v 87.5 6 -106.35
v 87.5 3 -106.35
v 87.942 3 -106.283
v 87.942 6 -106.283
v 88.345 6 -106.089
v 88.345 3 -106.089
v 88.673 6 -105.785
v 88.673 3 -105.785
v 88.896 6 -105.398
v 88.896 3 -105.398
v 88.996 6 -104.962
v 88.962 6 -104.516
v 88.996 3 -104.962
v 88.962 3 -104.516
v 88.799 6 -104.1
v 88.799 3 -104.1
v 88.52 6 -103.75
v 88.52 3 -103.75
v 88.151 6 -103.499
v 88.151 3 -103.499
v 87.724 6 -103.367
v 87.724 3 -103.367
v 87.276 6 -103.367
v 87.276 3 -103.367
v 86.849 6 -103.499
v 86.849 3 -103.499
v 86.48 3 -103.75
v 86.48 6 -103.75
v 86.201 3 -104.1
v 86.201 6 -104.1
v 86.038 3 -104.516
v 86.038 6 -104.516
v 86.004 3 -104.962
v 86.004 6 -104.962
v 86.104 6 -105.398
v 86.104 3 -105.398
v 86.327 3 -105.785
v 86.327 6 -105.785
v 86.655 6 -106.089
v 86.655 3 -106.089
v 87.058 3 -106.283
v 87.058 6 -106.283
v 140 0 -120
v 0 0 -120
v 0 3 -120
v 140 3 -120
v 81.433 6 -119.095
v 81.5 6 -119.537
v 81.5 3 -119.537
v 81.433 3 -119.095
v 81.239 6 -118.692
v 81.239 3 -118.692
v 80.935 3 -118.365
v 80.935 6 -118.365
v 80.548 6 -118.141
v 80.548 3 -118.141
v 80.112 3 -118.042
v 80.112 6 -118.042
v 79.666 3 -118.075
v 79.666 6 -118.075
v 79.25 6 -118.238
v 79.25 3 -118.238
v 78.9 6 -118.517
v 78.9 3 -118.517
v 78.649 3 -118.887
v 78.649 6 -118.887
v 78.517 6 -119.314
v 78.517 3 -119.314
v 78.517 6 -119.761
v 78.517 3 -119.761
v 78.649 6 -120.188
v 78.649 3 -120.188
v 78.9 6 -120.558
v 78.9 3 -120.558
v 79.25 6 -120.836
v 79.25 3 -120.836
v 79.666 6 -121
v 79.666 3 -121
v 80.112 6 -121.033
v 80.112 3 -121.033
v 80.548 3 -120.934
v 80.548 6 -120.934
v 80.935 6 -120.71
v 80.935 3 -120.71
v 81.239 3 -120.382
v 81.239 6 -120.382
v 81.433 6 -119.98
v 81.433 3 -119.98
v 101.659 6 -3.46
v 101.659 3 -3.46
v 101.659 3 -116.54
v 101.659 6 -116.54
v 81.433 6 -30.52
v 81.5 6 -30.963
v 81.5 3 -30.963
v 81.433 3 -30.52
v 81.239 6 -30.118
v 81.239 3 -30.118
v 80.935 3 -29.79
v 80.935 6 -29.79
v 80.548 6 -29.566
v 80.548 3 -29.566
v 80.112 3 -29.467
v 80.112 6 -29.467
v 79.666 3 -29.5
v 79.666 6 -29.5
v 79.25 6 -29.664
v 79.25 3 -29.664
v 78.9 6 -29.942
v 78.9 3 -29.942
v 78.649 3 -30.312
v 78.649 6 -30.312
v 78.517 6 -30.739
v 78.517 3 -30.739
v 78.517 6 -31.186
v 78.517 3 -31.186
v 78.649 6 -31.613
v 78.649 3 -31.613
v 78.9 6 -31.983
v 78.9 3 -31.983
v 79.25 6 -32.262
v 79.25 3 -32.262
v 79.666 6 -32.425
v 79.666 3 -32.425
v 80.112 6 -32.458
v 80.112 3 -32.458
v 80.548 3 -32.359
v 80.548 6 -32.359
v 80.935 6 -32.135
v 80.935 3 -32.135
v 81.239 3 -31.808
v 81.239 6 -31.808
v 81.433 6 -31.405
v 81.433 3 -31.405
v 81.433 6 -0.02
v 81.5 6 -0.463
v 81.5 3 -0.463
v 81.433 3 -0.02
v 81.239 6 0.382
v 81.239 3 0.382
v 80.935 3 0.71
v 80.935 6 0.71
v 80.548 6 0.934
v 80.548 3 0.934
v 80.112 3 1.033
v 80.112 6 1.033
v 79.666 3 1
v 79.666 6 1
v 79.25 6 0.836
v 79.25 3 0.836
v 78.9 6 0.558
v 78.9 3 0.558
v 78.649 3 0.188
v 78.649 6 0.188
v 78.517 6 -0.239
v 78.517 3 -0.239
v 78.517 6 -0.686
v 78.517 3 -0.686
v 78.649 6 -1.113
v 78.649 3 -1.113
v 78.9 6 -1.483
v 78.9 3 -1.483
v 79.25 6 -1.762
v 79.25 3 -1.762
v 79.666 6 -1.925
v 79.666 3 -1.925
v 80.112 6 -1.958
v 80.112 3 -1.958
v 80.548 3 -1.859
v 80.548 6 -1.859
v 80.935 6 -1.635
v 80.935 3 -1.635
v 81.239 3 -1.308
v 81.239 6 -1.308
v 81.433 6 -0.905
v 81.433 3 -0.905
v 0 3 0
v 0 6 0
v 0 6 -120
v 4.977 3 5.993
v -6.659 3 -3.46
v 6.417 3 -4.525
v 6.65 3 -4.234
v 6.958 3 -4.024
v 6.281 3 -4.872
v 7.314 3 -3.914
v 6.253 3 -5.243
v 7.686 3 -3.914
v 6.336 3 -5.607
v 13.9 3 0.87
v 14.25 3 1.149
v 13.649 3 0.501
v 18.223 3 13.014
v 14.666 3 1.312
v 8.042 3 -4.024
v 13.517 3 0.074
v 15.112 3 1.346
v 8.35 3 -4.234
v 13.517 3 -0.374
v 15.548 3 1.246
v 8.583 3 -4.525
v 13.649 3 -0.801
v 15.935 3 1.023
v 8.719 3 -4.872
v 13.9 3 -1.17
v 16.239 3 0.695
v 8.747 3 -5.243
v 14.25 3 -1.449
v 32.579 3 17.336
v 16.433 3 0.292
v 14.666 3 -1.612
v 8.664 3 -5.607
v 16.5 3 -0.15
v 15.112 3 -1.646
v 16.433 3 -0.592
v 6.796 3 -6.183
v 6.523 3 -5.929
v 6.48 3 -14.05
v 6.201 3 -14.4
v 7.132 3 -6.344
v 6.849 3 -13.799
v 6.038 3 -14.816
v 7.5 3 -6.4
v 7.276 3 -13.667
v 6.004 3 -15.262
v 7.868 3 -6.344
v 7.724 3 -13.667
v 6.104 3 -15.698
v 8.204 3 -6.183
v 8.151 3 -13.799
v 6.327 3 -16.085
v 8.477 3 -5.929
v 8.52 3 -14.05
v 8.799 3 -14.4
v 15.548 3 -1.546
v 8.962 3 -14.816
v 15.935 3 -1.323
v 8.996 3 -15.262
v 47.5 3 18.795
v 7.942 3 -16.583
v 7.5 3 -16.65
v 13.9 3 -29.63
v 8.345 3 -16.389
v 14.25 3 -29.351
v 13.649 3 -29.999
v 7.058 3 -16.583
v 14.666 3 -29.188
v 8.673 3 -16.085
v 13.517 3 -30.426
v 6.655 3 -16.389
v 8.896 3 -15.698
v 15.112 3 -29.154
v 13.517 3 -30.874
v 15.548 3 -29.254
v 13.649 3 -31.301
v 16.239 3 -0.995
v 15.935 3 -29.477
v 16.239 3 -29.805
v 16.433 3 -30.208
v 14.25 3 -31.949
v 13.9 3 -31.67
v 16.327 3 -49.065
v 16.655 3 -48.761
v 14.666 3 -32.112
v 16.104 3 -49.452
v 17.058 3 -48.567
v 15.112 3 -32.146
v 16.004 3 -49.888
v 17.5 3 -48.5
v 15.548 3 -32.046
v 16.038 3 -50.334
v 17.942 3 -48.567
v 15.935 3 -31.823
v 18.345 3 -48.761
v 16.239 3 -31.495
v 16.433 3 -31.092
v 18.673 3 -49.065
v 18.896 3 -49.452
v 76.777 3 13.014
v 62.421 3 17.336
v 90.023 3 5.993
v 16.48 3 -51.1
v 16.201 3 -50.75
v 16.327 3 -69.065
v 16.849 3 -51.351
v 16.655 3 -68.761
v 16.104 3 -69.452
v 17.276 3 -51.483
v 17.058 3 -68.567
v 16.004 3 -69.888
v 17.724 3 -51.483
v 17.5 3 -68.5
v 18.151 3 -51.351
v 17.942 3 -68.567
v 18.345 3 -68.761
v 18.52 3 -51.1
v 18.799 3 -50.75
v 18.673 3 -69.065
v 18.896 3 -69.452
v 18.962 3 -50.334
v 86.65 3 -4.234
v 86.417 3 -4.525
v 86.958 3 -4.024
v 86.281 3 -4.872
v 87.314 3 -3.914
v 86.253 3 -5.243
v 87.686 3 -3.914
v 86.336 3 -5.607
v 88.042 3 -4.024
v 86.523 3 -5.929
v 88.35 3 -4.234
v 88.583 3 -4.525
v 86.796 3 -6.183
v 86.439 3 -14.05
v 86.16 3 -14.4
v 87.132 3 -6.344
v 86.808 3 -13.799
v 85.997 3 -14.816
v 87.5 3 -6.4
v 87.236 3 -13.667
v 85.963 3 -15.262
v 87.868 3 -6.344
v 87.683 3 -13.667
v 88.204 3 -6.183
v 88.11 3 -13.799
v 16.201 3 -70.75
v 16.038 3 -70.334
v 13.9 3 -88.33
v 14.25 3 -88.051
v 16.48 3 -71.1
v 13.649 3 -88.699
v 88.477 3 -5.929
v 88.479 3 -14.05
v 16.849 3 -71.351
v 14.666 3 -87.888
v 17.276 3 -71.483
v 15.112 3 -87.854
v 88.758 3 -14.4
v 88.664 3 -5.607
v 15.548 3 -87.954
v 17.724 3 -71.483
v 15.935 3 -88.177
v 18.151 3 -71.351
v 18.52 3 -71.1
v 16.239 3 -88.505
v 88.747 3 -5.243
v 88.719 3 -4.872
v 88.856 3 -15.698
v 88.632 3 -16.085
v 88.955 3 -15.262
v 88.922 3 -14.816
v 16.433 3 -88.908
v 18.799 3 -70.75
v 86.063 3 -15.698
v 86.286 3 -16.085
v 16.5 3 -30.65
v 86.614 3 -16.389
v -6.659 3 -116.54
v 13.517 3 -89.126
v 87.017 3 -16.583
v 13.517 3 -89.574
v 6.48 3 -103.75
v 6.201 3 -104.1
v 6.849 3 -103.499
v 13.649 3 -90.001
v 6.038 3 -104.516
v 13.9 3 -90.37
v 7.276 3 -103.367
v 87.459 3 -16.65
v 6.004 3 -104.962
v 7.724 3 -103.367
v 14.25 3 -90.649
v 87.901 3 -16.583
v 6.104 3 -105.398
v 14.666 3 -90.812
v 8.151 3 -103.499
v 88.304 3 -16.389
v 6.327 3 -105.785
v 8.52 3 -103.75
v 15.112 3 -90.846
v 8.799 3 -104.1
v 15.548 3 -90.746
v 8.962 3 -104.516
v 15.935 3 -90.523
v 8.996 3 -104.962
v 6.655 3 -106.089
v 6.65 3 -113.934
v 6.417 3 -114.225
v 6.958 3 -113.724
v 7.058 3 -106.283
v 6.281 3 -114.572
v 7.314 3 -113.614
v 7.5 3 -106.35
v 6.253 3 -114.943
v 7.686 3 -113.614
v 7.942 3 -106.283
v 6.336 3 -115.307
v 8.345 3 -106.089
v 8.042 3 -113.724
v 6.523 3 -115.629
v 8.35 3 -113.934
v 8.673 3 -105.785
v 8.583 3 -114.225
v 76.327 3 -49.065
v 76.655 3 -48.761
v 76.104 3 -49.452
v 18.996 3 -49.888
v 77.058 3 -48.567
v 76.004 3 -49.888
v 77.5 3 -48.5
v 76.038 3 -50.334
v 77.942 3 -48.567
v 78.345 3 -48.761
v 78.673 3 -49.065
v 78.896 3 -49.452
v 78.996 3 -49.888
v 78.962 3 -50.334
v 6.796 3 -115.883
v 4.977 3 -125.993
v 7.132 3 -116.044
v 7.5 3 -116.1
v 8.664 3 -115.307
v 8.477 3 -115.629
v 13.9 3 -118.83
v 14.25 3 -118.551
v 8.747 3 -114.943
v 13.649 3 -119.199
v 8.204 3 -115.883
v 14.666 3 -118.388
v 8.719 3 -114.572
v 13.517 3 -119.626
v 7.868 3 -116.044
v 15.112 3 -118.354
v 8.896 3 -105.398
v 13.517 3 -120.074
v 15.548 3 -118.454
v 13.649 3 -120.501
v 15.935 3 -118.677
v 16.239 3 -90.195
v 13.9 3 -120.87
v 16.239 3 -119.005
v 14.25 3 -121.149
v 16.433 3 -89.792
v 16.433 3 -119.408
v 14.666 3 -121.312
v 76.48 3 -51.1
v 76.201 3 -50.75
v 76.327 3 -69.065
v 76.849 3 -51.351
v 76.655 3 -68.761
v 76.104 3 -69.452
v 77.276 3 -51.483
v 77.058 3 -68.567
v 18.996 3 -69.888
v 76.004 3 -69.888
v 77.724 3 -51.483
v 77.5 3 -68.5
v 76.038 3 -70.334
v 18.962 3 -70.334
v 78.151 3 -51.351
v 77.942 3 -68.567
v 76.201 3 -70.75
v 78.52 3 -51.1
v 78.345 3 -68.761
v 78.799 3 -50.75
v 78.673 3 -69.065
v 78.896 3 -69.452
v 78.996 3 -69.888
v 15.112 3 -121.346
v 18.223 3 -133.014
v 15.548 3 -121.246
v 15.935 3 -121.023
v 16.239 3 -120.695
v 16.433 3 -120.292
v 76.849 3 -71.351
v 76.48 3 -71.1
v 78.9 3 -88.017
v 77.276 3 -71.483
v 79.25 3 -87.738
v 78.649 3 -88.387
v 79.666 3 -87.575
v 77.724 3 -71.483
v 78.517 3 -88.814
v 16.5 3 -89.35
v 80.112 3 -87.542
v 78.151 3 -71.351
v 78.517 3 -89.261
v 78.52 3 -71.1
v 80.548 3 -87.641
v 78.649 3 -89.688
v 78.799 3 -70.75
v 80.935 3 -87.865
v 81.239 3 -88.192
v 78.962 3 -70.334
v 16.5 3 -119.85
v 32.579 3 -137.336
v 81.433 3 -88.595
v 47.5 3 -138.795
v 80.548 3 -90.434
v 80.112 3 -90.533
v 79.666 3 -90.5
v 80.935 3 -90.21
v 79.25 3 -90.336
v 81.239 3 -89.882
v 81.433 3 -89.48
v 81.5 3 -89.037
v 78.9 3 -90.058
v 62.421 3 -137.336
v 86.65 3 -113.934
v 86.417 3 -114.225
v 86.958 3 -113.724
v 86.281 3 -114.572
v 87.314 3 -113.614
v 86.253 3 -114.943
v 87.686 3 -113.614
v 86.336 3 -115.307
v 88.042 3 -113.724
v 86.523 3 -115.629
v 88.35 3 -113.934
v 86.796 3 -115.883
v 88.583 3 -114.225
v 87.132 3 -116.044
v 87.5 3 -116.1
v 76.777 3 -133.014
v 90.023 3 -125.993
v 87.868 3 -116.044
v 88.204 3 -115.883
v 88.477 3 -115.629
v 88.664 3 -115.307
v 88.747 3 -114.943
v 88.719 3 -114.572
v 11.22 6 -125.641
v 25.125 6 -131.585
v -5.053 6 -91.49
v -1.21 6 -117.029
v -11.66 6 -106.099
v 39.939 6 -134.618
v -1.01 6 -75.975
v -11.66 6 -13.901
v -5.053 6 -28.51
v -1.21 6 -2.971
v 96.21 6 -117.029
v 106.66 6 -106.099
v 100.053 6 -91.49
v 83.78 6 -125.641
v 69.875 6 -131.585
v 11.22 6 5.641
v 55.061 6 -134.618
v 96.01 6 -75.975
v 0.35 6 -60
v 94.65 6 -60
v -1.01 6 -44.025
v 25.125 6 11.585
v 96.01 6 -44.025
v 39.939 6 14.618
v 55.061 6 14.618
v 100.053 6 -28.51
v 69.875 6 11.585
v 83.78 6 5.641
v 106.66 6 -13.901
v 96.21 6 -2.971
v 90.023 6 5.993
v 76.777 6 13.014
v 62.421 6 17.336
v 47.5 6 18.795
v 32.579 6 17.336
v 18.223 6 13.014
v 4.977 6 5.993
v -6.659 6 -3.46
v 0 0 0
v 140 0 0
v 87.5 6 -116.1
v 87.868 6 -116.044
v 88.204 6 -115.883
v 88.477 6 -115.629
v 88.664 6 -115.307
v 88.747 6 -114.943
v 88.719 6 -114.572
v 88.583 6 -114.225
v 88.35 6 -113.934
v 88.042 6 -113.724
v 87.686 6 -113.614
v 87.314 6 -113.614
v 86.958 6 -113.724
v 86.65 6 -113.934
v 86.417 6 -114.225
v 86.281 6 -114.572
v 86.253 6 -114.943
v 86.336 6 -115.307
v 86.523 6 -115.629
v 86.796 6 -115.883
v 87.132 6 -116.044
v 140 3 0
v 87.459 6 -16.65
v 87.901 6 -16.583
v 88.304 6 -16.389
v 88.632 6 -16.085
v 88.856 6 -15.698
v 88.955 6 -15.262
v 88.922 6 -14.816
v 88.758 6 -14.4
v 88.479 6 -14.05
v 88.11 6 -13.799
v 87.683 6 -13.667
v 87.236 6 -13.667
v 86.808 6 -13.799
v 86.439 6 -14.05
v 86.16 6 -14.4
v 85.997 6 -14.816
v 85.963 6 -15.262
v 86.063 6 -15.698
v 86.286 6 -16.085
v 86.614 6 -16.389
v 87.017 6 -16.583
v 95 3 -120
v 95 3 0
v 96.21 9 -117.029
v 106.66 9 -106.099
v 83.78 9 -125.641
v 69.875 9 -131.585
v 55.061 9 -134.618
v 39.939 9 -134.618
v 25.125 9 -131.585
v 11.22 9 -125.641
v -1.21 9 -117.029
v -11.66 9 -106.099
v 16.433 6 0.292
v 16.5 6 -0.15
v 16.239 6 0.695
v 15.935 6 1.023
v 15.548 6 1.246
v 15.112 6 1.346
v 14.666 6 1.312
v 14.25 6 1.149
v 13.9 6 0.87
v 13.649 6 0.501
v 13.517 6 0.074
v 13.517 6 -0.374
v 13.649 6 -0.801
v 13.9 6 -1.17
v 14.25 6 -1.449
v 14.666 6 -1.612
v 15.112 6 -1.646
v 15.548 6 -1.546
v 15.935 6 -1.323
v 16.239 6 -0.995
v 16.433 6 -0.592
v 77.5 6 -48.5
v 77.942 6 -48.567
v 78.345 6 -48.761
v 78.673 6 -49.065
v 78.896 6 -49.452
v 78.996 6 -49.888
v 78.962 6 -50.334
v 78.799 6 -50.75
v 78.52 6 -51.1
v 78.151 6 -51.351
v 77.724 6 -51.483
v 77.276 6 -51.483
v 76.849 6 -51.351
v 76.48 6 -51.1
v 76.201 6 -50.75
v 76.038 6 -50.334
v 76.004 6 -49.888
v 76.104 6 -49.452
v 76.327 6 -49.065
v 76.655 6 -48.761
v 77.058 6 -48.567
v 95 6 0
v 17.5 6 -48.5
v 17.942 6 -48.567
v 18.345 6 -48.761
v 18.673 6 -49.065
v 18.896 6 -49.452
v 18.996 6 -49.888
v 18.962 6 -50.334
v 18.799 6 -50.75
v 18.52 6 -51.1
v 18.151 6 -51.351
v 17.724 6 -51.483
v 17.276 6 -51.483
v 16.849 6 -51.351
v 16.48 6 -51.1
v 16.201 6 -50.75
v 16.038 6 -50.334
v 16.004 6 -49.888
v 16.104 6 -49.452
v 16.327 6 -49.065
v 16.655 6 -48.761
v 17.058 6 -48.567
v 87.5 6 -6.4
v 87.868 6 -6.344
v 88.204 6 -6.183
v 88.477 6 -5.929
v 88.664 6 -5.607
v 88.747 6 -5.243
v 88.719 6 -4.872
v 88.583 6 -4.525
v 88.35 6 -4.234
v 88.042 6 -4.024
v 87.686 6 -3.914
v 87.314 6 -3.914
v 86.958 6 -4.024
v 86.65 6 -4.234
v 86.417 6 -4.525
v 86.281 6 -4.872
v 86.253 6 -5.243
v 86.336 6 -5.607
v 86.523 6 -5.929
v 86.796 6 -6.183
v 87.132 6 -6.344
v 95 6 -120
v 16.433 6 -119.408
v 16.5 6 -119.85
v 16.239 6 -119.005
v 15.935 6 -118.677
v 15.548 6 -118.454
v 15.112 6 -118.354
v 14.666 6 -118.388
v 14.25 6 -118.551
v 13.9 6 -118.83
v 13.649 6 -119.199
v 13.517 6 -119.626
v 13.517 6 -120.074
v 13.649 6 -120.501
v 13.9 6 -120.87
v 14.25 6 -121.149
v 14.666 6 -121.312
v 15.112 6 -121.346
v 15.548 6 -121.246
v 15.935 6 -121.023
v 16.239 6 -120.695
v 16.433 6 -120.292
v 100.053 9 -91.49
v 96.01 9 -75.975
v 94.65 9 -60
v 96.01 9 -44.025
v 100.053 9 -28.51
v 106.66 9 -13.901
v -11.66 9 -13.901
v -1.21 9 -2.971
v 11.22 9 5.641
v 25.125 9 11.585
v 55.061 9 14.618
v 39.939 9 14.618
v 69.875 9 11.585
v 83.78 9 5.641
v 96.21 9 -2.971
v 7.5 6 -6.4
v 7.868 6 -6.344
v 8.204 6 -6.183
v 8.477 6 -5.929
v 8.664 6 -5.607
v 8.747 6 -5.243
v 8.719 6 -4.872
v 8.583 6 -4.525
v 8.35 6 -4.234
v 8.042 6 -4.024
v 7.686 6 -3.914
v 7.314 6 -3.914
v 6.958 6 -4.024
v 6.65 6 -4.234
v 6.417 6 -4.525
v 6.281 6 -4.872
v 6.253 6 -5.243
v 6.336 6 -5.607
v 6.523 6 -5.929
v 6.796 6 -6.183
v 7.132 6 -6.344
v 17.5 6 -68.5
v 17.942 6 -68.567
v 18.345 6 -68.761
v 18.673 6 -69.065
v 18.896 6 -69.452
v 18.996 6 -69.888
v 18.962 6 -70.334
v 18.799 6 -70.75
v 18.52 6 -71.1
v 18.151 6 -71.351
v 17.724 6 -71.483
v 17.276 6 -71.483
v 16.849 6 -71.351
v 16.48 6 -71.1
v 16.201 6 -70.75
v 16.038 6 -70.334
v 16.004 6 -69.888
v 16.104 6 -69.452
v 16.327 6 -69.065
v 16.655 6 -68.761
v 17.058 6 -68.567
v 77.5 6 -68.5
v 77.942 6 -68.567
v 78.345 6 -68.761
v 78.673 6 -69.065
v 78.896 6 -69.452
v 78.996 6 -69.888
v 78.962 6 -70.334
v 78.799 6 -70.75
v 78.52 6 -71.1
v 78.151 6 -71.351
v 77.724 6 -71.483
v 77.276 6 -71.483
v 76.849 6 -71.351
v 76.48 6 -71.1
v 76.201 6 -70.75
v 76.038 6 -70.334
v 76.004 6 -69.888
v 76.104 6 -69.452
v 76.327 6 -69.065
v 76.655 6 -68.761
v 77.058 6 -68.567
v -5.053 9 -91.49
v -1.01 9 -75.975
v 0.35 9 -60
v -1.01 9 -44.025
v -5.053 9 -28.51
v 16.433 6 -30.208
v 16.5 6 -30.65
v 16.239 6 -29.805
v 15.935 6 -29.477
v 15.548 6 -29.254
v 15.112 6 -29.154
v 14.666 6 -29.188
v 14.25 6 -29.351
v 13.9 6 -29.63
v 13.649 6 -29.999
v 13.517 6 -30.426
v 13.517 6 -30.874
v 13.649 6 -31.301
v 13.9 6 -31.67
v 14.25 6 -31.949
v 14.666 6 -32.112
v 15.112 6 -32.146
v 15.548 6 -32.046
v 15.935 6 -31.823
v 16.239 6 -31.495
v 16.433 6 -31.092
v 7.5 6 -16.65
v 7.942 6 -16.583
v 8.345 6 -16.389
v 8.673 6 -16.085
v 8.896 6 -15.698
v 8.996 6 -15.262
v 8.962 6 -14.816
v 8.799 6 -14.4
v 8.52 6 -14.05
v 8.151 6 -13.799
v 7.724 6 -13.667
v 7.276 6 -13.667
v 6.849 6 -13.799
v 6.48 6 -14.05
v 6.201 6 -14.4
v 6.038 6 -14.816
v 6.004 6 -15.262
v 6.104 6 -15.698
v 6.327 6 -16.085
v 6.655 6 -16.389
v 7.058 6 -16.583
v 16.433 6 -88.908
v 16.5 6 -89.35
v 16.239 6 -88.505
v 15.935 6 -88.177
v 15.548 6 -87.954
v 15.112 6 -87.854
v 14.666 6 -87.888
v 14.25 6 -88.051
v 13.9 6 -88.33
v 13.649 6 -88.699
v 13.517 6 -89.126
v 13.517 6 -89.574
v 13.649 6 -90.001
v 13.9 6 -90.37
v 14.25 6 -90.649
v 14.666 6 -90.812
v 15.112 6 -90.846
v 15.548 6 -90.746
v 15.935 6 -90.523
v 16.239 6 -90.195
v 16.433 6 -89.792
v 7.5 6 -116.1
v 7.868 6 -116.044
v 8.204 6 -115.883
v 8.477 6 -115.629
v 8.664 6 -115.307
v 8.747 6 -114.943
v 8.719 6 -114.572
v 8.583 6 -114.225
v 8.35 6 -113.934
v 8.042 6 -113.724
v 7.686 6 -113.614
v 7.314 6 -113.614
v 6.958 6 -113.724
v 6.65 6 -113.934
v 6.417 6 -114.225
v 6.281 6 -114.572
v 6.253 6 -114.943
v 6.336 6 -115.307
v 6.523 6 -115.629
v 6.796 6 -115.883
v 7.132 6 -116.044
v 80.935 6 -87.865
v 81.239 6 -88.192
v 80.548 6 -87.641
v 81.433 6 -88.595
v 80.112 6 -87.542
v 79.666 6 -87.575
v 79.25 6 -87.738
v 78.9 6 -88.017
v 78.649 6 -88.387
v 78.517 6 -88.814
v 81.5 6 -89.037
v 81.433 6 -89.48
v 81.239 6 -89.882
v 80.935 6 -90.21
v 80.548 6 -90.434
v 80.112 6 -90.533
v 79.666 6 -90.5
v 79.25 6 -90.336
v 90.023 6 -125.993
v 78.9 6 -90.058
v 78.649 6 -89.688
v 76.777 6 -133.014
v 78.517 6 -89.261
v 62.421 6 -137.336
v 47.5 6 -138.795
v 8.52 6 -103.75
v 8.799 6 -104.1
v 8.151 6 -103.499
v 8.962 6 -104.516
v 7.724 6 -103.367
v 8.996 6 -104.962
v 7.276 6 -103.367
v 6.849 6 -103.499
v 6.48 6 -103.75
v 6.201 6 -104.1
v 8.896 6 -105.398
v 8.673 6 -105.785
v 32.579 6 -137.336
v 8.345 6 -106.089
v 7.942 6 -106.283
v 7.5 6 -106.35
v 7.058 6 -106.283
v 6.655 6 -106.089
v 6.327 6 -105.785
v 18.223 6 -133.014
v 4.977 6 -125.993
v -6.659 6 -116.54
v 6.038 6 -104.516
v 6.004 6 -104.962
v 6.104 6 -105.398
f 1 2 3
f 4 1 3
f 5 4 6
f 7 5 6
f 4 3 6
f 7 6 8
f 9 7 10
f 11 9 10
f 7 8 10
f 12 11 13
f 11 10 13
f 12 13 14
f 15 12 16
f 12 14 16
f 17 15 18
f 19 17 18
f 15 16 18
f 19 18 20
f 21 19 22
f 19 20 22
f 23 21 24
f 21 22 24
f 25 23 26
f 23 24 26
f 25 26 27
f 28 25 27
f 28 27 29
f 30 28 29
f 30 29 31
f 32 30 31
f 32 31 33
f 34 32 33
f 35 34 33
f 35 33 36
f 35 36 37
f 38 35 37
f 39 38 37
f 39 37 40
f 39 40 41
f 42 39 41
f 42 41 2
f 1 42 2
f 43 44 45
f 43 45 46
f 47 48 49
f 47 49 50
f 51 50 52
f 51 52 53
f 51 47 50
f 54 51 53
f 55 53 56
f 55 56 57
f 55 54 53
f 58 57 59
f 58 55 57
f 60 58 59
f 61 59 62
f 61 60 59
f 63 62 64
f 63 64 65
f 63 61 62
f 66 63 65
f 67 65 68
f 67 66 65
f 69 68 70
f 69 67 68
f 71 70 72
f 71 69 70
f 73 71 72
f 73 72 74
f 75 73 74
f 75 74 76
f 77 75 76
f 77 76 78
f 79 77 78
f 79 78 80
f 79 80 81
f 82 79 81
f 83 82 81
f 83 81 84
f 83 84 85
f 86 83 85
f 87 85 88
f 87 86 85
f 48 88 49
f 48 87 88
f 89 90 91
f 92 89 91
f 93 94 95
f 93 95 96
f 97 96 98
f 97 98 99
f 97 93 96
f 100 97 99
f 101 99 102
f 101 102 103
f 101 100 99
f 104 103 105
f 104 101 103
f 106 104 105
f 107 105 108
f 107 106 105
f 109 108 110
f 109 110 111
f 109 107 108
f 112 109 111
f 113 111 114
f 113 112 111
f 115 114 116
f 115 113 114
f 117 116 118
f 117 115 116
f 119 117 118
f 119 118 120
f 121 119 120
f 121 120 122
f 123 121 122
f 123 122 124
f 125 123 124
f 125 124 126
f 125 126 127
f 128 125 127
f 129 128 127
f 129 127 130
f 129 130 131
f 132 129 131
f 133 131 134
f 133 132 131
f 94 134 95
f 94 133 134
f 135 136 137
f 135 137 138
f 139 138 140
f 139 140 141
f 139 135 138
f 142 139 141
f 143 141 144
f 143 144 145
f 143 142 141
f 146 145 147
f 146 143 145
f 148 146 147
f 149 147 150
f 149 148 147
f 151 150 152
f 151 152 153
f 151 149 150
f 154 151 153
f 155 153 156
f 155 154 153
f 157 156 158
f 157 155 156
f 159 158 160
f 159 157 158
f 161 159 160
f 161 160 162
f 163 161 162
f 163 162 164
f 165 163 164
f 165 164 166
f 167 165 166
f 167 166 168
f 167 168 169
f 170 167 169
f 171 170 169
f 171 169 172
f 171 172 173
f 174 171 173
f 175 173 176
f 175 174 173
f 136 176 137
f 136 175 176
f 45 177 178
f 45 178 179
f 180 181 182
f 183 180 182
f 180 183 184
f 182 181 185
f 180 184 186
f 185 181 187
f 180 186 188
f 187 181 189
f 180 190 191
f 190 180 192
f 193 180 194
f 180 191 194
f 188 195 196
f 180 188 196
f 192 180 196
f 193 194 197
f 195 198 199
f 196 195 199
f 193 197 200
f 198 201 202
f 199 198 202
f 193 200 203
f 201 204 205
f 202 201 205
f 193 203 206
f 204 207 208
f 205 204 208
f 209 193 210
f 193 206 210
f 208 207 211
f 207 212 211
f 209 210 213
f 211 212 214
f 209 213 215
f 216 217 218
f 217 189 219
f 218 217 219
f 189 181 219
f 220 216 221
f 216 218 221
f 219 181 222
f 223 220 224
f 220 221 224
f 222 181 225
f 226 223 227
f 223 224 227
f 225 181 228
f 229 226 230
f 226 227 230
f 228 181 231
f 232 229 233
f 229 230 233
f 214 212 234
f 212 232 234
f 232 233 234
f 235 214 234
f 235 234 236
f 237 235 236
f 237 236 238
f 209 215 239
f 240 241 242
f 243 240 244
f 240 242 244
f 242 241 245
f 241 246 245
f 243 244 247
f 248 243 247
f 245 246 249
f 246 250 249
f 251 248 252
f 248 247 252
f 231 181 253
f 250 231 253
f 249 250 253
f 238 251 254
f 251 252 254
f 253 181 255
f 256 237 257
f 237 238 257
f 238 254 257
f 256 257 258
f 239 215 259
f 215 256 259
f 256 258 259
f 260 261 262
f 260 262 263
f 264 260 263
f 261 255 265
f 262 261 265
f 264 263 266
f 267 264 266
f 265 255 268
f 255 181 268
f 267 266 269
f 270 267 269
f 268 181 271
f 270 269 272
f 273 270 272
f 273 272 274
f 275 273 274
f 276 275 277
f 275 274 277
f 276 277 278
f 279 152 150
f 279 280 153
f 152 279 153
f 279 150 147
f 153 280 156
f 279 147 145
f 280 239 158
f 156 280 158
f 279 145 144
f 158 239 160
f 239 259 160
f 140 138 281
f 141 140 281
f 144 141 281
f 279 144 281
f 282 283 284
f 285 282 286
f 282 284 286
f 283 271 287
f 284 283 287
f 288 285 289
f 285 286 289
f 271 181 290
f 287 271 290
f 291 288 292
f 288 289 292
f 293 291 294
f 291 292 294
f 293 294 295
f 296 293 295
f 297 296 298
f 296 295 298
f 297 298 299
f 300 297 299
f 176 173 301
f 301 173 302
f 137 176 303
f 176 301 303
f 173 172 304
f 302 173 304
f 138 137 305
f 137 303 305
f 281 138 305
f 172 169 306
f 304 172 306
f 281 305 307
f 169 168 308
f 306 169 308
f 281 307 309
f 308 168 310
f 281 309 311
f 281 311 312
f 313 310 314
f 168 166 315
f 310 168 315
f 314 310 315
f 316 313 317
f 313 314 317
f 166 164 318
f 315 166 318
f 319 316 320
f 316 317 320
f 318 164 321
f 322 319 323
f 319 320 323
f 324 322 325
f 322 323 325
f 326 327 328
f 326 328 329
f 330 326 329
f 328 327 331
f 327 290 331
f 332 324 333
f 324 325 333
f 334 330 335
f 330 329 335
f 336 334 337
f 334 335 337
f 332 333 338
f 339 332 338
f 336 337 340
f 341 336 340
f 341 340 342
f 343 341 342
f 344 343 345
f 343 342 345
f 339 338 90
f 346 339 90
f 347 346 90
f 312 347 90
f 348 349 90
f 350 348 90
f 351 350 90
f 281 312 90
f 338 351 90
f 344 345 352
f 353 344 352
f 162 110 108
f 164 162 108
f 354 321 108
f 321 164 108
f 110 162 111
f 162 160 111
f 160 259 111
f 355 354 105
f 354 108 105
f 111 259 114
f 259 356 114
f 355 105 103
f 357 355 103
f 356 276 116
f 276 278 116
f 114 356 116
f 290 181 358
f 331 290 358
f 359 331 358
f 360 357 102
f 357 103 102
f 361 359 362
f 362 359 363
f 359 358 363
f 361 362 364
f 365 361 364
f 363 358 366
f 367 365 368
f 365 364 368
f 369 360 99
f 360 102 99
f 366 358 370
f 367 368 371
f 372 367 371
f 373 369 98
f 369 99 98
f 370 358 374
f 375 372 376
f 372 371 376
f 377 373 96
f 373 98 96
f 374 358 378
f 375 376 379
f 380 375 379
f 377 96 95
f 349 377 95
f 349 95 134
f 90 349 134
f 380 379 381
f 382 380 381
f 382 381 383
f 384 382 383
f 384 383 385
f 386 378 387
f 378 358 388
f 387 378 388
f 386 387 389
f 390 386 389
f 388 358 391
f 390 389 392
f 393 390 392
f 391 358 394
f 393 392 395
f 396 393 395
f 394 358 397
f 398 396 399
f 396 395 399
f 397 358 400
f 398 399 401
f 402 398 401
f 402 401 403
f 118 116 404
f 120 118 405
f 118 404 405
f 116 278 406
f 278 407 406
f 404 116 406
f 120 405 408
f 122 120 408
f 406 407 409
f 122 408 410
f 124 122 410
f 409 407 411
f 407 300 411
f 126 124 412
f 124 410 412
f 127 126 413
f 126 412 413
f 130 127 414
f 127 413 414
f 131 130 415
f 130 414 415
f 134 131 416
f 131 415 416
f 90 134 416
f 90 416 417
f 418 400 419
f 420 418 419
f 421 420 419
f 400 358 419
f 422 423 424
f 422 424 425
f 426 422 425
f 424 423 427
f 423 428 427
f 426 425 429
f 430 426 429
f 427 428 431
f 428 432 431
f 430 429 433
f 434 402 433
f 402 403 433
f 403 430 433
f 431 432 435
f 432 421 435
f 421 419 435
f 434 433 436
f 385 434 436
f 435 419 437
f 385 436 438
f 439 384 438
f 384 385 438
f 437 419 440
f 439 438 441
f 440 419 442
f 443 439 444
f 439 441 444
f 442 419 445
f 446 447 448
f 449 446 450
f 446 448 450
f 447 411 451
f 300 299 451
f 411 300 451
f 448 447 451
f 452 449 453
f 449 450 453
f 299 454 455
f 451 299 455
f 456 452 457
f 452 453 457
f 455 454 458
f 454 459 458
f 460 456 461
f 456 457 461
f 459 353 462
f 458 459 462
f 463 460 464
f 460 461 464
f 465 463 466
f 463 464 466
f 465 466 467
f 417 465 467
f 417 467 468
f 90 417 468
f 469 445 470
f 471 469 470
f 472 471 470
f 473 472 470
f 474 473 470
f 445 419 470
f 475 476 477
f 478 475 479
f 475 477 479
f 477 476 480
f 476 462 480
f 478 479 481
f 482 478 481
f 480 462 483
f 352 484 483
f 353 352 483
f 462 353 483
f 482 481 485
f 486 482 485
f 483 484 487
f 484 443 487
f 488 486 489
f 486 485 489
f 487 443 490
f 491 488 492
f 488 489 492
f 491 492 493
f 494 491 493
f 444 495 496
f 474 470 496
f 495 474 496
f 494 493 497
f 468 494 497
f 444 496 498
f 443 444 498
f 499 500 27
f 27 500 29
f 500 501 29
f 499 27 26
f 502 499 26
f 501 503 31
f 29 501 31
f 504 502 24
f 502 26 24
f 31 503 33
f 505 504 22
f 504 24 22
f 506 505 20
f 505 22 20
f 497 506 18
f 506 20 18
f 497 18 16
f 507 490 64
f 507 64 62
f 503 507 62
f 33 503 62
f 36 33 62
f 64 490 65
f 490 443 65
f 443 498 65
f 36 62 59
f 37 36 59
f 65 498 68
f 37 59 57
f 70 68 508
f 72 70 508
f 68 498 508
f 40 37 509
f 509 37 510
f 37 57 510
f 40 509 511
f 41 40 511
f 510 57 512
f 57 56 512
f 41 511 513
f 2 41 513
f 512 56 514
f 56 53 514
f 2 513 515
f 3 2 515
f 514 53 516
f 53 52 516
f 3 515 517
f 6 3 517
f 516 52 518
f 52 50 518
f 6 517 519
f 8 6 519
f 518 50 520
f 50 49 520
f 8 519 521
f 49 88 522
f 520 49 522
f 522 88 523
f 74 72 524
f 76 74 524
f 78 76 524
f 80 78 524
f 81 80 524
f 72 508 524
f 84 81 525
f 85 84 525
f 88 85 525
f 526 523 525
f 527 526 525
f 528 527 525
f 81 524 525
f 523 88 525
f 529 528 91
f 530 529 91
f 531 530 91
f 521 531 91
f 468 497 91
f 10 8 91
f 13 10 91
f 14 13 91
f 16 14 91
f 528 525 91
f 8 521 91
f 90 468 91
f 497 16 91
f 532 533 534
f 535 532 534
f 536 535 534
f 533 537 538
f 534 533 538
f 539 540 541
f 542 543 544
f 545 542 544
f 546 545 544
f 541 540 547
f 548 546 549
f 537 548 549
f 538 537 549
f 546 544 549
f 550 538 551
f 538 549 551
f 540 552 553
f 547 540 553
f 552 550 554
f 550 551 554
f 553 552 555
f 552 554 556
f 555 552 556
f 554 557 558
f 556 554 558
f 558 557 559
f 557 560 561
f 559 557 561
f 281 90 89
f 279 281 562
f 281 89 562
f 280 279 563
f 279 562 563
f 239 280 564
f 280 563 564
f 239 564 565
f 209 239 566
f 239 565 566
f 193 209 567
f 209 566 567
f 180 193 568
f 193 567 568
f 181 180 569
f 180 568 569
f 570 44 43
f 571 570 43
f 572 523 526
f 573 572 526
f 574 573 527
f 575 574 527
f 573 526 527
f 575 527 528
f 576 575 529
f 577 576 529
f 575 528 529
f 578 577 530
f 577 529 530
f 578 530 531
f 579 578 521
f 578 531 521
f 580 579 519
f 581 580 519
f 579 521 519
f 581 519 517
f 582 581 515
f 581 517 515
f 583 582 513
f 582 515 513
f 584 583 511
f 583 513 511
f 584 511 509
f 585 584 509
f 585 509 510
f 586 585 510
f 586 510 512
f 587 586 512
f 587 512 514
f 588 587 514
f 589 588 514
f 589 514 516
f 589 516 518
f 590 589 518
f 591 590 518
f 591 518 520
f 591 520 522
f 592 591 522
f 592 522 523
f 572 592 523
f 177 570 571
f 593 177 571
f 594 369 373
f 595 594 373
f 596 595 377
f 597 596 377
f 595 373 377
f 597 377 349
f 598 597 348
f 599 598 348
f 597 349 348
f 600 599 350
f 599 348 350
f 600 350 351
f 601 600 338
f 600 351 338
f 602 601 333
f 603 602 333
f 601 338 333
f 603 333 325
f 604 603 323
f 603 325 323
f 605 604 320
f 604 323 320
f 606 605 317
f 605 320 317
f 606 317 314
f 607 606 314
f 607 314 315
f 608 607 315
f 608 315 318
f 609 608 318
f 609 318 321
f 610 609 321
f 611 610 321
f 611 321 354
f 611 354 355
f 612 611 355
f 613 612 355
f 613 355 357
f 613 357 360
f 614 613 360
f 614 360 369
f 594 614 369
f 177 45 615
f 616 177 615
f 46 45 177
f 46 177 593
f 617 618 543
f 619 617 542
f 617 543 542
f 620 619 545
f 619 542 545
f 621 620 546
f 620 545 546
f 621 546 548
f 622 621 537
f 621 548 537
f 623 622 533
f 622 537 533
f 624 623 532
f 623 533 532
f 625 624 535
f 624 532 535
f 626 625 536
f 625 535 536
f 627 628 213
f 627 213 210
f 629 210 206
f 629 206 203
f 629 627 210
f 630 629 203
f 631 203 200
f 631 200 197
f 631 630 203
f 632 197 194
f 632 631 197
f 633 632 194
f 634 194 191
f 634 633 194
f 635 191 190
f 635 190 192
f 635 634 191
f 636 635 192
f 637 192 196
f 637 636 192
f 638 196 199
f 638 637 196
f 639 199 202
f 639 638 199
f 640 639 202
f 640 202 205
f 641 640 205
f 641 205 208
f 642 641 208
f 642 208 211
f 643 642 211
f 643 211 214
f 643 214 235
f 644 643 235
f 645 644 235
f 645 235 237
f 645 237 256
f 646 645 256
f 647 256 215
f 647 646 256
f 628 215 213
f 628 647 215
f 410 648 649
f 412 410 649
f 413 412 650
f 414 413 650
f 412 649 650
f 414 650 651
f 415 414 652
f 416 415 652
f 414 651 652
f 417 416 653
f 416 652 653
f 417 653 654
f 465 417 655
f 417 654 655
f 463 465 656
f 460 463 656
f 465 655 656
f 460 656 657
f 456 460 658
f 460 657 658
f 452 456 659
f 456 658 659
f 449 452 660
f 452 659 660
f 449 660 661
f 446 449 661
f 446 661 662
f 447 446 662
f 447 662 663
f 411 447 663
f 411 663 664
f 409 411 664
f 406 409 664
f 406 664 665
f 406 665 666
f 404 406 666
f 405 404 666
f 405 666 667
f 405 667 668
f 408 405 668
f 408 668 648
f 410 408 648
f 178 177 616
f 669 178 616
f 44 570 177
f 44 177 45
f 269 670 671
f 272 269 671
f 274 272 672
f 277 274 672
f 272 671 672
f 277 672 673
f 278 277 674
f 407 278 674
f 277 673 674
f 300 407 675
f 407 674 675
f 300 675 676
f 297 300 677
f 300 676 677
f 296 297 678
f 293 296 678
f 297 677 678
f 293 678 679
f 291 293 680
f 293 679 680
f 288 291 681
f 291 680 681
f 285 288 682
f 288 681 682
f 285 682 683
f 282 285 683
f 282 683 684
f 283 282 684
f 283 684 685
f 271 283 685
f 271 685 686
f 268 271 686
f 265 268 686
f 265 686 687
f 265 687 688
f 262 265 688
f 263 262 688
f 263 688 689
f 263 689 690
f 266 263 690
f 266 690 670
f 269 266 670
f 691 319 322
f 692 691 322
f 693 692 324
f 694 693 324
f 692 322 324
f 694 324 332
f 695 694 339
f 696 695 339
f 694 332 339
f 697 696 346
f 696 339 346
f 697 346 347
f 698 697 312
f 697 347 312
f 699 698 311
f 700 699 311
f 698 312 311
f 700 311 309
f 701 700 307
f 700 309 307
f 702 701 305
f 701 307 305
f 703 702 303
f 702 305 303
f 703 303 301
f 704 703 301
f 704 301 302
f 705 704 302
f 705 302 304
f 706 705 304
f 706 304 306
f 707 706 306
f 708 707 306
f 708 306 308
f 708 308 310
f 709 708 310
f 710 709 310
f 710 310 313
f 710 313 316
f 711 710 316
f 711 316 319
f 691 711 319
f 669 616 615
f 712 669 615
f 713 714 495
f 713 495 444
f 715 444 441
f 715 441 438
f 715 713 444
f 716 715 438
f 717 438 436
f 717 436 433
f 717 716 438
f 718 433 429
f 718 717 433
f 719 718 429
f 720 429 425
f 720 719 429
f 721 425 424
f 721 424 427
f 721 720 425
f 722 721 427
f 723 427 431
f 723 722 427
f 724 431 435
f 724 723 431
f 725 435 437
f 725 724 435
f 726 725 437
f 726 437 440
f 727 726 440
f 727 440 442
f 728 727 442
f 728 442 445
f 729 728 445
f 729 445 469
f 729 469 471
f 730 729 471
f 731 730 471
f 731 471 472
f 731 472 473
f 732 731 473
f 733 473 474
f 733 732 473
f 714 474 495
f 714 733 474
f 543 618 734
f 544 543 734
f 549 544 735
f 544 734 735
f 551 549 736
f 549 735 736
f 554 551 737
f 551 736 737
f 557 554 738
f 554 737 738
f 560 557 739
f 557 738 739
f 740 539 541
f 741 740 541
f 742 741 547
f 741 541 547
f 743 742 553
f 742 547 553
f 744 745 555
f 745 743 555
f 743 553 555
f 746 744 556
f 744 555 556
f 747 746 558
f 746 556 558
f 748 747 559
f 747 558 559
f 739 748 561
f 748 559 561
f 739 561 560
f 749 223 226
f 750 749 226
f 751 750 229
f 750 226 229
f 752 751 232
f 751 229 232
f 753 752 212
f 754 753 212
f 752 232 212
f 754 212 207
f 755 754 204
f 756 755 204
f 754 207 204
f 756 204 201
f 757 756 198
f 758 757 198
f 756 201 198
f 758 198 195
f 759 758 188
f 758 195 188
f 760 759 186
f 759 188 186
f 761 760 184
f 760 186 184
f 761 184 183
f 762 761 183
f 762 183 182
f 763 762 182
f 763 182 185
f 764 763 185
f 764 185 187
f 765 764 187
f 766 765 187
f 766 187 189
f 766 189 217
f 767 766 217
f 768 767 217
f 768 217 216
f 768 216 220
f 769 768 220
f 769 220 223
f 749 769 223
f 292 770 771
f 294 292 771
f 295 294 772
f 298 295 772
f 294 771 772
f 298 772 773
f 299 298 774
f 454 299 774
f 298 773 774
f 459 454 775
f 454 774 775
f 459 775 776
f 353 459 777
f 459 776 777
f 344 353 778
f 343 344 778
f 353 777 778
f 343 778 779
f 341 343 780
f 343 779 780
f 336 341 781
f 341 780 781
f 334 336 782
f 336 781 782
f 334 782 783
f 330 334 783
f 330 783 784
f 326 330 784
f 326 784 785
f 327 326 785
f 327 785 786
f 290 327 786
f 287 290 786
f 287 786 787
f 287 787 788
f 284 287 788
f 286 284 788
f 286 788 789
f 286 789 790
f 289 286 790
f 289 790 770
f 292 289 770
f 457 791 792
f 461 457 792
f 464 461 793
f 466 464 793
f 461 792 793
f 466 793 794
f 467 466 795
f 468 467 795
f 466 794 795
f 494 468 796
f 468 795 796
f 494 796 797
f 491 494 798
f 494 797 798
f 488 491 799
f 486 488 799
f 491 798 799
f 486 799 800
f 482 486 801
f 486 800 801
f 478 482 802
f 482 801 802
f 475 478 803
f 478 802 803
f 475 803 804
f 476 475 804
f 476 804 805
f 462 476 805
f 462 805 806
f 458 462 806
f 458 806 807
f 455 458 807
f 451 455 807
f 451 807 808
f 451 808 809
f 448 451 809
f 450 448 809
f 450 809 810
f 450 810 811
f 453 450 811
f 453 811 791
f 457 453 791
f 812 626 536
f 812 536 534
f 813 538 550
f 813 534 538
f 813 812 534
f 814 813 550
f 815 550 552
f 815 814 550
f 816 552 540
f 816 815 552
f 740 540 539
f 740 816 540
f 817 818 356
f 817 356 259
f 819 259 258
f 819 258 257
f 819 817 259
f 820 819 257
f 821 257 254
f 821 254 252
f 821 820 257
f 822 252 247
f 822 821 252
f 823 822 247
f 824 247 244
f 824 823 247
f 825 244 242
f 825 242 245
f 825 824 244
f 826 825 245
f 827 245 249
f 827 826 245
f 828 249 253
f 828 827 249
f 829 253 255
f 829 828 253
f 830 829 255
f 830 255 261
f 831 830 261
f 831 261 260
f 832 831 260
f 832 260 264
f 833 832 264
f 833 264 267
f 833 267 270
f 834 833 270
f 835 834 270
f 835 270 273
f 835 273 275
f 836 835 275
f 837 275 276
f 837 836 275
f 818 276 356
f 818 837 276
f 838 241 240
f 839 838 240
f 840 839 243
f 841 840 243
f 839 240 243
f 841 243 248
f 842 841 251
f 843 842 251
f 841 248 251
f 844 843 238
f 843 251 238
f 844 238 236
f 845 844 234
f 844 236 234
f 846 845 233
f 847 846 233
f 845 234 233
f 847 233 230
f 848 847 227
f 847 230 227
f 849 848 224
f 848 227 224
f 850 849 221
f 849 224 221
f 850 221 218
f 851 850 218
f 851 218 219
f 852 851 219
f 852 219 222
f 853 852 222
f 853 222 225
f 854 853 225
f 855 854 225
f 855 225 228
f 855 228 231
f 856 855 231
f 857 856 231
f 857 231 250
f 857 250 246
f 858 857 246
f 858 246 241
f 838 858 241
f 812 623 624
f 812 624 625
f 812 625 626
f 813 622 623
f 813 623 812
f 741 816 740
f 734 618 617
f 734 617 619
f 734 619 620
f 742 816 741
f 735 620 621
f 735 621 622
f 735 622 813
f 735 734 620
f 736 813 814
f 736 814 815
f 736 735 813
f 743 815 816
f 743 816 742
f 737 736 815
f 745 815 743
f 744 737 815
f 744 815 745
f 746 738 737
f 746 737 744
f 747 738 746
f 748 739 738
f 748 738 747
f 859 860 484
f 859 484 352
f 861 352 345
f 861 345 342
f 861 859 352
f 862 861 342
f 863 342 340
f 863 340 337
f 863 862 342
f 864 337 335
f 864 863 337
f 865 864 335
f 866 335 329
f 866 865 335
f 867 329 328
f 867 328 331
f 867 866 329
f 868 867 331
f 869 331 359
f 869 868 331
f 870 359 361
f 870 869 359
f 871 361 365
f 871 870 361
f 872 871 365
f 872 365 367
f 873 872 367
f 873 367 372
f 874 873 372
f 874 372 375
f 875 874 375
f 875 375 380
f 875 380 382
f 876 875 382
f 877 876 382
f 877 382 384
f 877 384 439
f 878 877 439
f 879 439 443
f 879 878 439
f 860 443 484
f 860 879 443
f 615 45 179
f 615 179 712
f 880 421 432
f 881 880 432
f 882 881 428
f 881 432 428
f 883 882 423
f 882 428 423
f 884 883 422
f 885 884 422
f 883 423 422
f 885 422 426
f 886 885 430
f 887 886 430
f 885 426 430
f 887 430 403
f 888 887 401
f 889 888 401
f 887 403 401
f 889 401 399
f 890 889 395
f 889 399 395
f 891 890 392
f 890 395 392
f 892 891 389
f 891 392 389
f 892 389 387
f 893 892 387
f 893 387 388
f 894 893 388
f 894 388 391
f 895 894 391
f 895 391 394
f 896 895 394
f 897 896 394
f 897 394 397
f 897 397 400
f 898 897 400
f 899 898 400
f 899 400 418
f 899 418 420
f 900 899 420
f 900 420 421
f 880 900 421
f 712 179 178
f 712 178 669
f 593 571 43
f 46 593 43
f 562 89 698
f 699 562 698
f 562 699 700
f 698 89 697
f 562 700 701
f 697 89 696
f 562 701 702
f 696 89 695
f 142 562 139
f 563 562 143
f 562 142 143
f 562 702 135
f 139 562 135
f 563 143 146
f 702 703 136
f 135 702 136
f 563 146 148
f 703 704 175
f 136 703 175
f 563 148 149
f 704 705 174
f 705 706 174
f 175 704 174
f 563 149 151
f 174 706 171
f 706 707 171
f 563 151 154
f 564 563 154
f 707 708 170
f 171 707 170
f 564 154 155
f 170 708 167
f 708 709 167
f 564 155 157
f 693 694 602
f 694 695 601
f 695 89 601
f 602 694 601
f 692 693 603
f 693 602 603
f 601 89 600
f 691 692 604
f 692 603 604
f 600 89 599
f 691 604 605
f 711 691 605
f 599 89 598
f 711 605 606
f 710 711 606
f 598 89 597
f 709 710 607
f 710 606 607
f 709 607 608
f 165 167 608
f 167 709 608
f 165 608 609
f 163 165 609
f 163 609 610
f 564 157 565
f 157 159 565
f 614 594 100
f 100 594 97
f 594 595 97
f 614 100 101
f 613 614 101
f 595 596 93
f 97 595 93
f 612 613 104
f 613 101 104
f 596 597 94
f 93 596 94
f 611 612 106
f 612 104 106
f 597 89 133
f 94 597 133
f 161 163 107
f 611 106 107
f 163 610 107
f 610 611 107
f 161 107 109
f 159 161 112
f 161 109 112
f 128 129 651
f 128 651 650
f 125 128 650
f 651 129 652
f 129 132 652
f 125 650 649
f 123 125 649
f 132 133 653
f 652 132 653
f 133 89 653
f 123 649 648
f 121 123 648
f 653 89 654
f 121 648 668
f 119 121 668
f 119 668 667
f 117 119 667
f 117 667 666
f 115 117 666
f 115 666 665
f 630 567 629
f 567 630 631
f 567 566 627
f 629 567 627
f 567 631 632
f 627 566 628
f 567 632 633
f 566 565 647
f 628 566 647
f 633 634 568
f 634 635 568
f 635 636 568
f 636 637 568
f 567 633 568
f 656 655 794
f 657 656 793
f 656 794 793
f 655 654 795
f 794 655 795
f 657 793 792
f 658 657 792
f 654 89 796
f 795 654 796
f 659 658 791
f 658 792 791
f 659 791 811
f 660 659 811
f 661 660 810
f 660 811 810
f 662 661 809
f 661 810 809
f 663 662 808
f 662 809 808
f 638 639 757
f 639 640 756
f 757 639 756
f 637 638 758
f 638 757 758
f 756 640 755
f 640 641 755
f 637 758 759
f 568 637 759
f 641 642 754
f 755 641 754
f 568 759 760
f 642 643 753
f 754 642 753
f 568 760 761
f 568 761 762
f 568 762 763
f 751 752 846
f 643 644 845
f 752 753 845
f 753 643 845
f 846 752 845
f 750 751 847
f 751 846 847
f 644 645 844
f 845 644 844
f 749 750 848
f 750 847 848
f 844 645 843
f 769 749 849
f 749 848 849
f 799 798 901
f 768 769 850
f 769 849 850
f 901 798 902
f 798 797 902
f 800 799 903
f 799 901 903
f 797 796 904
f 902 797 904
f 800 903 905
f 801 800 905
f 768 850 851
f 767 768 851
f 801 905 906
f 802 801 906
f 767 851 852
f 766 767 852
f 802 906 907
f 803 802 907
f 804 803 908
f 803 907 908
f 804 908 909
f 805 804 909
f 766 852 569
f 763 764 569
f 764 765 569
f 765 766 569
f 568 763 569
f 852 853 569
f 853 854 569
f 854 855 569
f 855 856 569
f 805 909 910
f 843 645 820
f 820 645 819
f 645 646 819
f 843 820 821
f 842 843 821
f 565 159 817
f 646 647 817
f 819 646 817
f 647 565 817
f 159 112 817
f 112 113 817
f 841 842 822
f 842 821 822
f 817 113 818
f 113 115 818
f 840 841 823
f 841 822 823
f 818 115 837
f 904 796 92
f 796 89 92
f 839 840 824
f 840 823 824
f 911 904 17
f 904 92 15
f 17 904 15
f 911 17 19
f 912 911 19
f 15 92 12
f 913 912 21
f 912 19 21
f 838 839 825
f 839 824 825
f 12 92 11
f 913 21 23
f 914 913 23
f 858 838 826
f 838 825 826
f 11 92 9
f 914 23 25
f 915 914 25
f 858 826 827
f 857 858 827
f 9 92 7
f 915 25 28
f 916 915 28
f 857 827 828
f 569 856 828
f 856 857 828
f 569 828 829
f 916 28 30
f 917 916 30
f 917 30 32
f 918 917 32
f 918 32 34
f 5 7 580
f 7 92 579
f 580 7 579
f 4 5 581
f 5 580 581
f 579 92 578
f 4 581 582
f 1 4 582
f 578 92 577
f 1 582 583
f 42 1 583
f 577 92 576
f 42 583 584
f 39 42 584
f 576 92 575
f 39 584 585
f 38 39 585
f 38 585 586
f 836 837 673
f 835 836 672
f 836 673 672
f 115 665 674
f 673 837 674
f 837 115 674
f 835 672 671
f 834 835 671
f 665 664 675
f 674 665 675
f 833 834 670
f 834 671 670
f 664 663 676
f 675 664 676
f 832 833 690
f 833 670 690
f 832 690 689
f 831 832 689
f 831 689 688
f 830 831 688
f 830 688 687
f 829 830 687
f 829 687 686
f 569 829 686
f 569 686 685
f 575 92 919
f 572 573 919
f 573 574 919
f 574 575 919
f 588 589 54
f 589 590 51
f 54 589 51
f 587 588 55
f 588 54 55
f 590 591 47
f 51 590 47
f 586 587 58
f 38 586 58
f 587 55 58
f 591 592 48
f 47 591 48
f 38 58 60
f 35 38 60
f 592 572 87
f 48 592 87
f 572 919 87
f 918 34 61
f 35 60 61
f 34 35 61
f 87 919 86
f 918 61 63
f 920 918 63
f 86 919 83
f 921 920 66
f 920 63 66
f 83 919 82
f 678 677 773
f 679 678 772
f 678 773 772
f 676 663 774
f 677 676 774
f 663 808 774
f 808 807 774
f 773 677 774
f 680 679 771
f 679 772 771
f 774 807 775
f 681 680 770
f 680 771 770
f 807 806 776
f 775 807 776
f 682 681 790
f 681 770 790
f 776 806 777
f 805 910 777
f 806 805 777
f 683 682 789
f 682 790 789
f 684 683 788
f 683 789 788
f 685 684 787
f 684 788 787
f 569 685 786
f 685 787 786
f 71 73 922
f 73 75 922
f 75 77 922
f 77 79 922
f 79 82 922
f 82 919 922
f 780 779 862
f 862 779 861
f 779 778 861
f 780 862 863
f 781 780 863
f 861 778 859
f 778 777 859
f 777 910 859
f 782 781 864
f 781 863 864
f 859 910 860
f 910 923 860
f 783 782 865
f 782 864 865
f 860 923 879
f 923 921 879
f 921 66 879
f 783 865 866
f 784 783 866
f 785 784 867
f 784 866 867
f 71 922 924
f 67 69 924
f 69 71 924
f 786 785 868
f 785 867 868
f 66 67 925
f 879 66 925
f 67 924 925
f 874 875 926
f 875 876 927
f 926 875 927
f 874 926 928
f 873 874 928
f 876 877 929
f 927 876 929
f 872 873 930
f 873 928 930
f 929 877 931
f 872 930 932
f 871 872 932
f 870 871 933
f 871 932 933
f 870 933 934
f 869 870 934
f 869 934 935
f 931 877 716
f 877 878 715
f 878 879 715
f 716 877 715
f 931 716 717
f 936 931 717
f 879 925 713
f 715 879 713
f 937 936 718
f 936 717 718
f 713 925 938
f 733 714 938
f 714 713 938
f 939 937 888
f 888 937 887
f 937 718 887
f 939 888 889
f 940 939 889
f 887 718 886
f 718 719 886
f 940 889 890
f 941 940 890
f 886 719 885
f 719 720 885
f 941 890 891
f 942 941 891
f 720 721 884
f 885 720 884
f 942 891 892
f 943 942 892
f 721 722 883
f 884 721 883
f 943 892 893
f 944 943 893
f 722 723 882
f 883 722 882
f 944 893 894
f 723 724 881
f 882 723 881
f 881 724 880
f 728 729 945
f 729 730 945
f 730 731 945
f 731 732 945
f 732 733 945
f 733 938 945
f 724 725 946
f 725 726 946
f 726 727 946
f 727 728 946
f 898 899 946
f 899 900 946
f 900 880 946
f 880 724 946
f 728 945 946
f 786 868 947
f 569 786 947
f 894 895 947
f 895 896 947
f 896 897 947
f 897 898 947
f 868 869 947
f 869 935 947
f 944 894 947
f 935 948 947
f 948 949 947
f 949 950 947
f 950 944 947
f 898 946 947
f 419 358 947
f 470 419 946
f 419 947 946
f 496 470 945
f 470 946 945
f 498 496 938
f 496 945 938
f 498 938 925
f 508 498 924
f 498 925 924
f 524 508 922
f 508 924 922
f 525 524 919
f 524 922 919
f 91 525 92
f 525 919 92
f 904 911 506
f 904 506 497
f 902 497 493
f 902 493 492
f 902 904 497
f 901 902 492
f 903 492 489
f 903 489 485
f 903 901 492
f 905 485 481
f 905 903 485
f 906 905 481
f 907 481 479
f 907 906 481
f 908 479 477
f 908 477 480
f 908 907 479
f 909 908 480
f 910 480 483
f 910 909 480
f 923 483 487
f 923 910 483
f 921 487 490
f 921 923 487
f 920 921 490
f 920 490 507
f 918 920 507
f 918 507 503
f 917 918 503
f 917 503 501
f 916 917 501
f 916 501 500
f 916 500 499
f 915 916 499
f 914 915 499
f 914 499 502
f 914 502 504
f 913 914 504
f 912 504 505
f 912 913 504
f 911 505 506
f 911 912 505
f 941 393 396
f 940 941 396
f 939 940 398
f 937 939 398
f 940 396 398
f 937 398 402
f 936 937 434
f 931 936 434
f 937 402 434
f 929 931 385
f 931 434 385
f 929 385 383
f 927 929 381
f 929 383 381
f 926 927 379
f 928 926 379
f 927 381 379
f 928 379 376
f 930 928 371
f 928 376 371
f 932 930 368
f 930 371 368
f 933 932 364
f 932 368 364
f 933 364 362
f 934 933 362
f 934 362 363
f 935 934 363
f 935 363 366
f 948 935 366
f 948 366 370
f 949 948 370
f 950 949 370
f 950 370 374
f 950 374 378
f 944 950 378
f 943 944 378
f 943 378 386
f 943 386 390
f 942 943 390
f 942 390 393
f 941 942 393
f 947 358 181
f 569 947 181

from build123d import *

# Parameters (mm, degrees)
SKETCH1_W                   = 140
SKETCH1_H                   = 120
COMPACT_DEPTH               = 3
SKETCH4_W                   = 95
SKETCH4_H                   = 120
SUPERCOMPACT_DEPTH          = 3
SKETCH7_R                   = 75
APPLE_BASE_DEPTH            = 3
SIDECUTS_DEPTH              = 195.694632694
APPLE_BASE_2_DEPTH          = 3
BOSS_EXTRUDE4_DEPTH         = 3
BASE_PLATE_FILLET_R         = 0.001
TOP_BOTTOM_EXTENSIONS_DEPTH = 3
SKETCH35_R                  = 1.25
SPACERHOLES_DEPTH           = 10
CUT_EXTRUDE4_DEPTH          = 10
SKETCH39_R                  = 1.5
CUT_EXTRUDE5_DEPTH          = 10
CUT_EXTRUDE6_START          = -3
CUT_EXTRUDE6_OUTLINE_R      = 1.5
CUT_EXTRUDE6_DEPTH          = 3
SKETCH41_R                  = 1.5
CUT_EXTRUDE7_DEPTH          = 10
SKETCH45_R                  = 1.5
CUT_EXTRUDE8_DEPTH          = 10


# Read off the part's stored shape, not the designer's step: Cut-Extrude6
with BuildPart() as part:
    # Sketch1 → Compact (new body)
    with BuildSketch(Plane(origin=(0, 0, 0), x_dir=(1, 0, 0), z_dir=(0, 1, 0))):
        with Locations((70, 60)):
            Rectangle(SKETCH1_W, SKETCH1_H)
    extrude(amount=COMPACT_DEPTH)


with BuildPart() as body_2:
    # Sketch4 → SuperCompact (new body)
    with BuildSketch(Plane(origin=(0, 3, 0), x_dir=(1, 0, 0), z_dir=(0, 1, 0))):
        with Locations((47.5, 60)):
            Rectangle(SKETCH4_W, SKETCH4_H)
    extrude(amount=SUPERCOMPACT_DEPTH)


with BuildPart() as body_3:
    # Sketch7 → Apple Base (new body)
    with BuildSketch(Plane(origin=(0, 6, 0), x_dir=(1, 0, 0), z_dir=(0, 1, 0))):
        with Locations(Location((47.5, 60, 0), (0, 0, 270))):
            Circle(SKETCH7_R)
    extrude(amount=APPLE_BASE_DEPTH)

    # Sketch8 → SideCuts (cut, through all)
    with BuildSketch(Plane(origin=(0, 9, 0), x_dir=(1, 0, 0), z_dir=(0, 1, 0))):
        with BuildLine():
            ThreePointArc((-11.66, 106.098746187), (0.350007958, 60), (-11.66, 13.901253813))
            ThreePointArc((-11.66, 13.901253813), (-27.5, 60), (-11.66, 106.098746187))
        make_face()
        with BuildLine():
            ThreePointArc((106.66, 106.098746187), (94.649992042, 60), (106.66, 13.901253813))
            ThreePointArc((106.66, 13.901253813), (122.5, 60), (106.66, 106.098746187))
        make_face()
    extrude(amount=-SIDECUTS_DEPTH, mode=Mode.SUBTRACT)


with BuildPart() as body_4:
    # Sketch9 → Apple_Base 2 (new body)
    with BuildSketch(Plane.XZ.offset(-6)):
        with BuildLine():
            ThreePointArc((106.66, -13.901253813), (47.5, 15), (-11.66, -13.901253813))
            ThreePointArc((-11.66, -13.901253813), (0.350007958, -60), (-11.66, -106.098746187))
            ThreePointArc((-11.66, -106.098746187), (47.5, -135), (106.66, -106.098746187))
            ThreePointArc((106.66, -106.098746187), (94.649992042, -60), (106.66, -13.901253813))
        make_face()
    extrude(amount=APPLE_BASE_2_DEPTH)

    # Sketch10 → Boss-Extrude4 (add)
    with BuildSketch(Plane(origin=(0, 6, 0), x_dir=(1, 0, 0), z_dir=(0, 1, 0))):
        with BuildLine():
            Line((-11.66, 106.098746187), (-11.66, 13.901253813))
            ThreePointArc((-11.66, 13.901253813), (0.350007958, 60), (-11.66, 106.098746187))
        make_face()
        with BuildLine():
            Line((106.66, 106.098746187), (106.66, 13.901253813))
            ThreePointArc((106.66, 13.901253813), (94.649992042, 60), (106.66, 106.098746187))
        make_face()
    extrude(amount=-BOSS_EXTRUDE4_DEPTH)

    # Base_Plate_Fillet
    base_plate_fillet_edges = [body_4.edges().sort_by_distance(p)[0] for p in [
        (-11.66, 3, -60),
        (-11.66, 6, -60),
        (47.5, 3, -135),
        (106.66, 3, -60),
        (106.66, 6, -60),
        (47.5, 6, -135),
        (47.5, 6, 15),
        (106.66, 4.5, -106.098746187),
        (-11.66, 4.5, -106.098746187),
        (-11.66, 4.5, -13.901253813),
        (106.66, 4.5, -13.901253813),
        (47.5, 3, 15),
    ]]
    fillet(base_plate_fillet_edges, radius=BASE_PLATE_FILLET_R)

    # Sketch25 → Top Bottom extensions (add)
    with BuildSketch(Plane(origin=(0, 6, 0), x_dir=(1, 0, 0), z_dir=(0, 1, 0))):
        with BuildLine():
            Line((-11.659005821, 106.097402592), (-11.659005821, 111.097402592))
            ThreePointArc((-11.659005821, 111.097402592), (47.5, 138.794628322), (106.659005821, 111.097402592))
            Line((106.659005821, 111.097402592), (106.659005821, 106.097402592))
            ThreePointArc((106.659005821, 106.097402592), (47.5, 133.794628322), (-11.659005821, 106.097402592))
        make_face()
        with BuildLine():
            Line((106.659005821, 13.902597408), (106.659005821, 8.902597408))
            ThreePointArc((106.659005821, 8.902597408), (47.5, -18.794628322), (-11.659005821, 8.902597408))
            Line((-11.659005821, 8.902597408), (-11.659005821, 13.902597408))
            ThreePointArc((-11.659005821, 13.902597408), (47.5, -13.794628322), (106.659005821, 13.902597408))
        make_face()
    extrude(amount=-TOP_BOTTOM_EXTENSIONS_DEPTH)

    # Sketch35 → SpacerHoles (cut)
    with BuildSketch(Plane.XZ.offset(-3)):
        with Locations(Location((7.5, -5.15, 0), (0, 0, 270))):
            Circle(SKETCH35_R)
        with Locations(Location((87.5, -5.15, 0), (0, 0, 270))):
            Circle(SKETCH35_R)
        with Locations(Location((87.5, -114.85, 0), (0, 0, 270))):
            Circle(SKETCH35_R)
        with Locations(Location((7.5, -114.85, 0), (0, 0, 270))):
            Circle(SKETCH35_R)
    extrude(amount=-SPACERHOLES_DEPTH, mode=Mode.SUBTRACT)

    # Sketch38 → Cut-Extrude4 (cut)
    with BuildSketch(Plane.XZ.offset(-3)):
        Polygon((47.5, 37.050137759), (120.372278362, 37.050137759), (120.372278362, -158.601845129), (-29.177494987, -158.601845129), (-29.177494987, 37.050137759), align=None)
        Polygon((-6.659, -60), (-6.659, 24.702355976), (101.659, 24.702355976), (101.659, -143.843523469), (-6.659, -143.843523469), align=None, mode=Mode.SUBTRACT)
    extrude(amount=-CUT_EXTRUDE4_DEPTH, mode=Mode.SUBTRACT)

    # Sketch39 → Cut-Extrude5 (cut)
    with BuildSketch(Plane.XZ.offset(-3)):
        with Locations(Location((7.5, -104.85, 0), (0, 0, 270))):
            Circle(SKETCH39_R)
        with Locations(Location((87.5, -104.85, 0), (0, 0, 270))):
            Circle(SKETCH39_R)
    extrude(amount=-CUT_EXTRUDE5_DEPTH, mode=Mode.SUBTRACT)

    # Cut-Extrude6 outline → Cut-Extrude6 (cut)
    with BuildSketch(Plane.XZ.offset(-3).offset(CUT_EXTRUDE6_START)):
        with Locations((15, -0.15)):
            Circle(CUT_EXTRUDE6_OUTLINE_R)
        with Locations((15, -119.85)):
            Circle(CUT_EXTRUDE6_OUTLINE_R)
        with Locations((80, -119.537367713)):
            Circle(CUT_EXTRUDE6_OUTLINE_R)
        with Locations((80, -89.037367713)):
            Circle(CUT_EXTRUDE6_OUTLINE_R)
        with Locations((80, -0.462632287)):
            Circle(CUT_EXTRUDE6_OUTLINE_R)
        with Locations((15, -30.65)):
            Circle(CUT_EXTRUDE6_OUTLINE_R)
        with Locations((80, -30.962632287)):
            Circle(CUT_EXTRUDE6_OUTLINE_R)
        with Locations((15, -89.35)):
            Circle(CUT_EXTRUDE6_OUTLINE_R)
    extrude(amount=CUT_EXTRUDE6_DEPTH, mode=Mode.SUBTRACT)

    # Sketch41 → Cut-Extrude7 (cut)
    with BuildSketch(Plane.XZ.offset(-3)):
        with Locations(Location((7.5, -15.15, 0), (0, 0, 270))):
            Circle(SKETCH41_R)
        with Locations(Location((87.459210086, -15.15, 0), (0, 0, 270))):
            Circle(SKETCH41_R)
    extrude(amount=-CUT_EXTRUDE7_DEPTH, mode=Mode.SUBTRACT)

    # Sketch45 → Cut-Extrude8 (cut)
    with BuildSketch(Plane(origin=(0, 6, 0), x_dir=(1, 0, 0), z_dir=(0, 1, 0))):
        with Locations(Location((77.5, 70, 0), (0, 0, 270))):
            Circle(SKETCH45_R)
        with Locations(Location((17.5, 70, 0), (0, 0, 270))):
            Circle(SKETCH45_R)
        with Locations(Location((17.5, 50, 0), (0, 0, 270))):
            Circle(SKETCH45_R)
        with Locations(Location((77.5, 50, 0), (0, 0, 270))):
            Circle(SKETCH45_R)
    extrude(amount=-CUT_EXTRUDE8_DEPTH, mode=Mode.SUBTRACT)


solid = Compound([part.part, body_2.part, body_3.part, body_4.part])
